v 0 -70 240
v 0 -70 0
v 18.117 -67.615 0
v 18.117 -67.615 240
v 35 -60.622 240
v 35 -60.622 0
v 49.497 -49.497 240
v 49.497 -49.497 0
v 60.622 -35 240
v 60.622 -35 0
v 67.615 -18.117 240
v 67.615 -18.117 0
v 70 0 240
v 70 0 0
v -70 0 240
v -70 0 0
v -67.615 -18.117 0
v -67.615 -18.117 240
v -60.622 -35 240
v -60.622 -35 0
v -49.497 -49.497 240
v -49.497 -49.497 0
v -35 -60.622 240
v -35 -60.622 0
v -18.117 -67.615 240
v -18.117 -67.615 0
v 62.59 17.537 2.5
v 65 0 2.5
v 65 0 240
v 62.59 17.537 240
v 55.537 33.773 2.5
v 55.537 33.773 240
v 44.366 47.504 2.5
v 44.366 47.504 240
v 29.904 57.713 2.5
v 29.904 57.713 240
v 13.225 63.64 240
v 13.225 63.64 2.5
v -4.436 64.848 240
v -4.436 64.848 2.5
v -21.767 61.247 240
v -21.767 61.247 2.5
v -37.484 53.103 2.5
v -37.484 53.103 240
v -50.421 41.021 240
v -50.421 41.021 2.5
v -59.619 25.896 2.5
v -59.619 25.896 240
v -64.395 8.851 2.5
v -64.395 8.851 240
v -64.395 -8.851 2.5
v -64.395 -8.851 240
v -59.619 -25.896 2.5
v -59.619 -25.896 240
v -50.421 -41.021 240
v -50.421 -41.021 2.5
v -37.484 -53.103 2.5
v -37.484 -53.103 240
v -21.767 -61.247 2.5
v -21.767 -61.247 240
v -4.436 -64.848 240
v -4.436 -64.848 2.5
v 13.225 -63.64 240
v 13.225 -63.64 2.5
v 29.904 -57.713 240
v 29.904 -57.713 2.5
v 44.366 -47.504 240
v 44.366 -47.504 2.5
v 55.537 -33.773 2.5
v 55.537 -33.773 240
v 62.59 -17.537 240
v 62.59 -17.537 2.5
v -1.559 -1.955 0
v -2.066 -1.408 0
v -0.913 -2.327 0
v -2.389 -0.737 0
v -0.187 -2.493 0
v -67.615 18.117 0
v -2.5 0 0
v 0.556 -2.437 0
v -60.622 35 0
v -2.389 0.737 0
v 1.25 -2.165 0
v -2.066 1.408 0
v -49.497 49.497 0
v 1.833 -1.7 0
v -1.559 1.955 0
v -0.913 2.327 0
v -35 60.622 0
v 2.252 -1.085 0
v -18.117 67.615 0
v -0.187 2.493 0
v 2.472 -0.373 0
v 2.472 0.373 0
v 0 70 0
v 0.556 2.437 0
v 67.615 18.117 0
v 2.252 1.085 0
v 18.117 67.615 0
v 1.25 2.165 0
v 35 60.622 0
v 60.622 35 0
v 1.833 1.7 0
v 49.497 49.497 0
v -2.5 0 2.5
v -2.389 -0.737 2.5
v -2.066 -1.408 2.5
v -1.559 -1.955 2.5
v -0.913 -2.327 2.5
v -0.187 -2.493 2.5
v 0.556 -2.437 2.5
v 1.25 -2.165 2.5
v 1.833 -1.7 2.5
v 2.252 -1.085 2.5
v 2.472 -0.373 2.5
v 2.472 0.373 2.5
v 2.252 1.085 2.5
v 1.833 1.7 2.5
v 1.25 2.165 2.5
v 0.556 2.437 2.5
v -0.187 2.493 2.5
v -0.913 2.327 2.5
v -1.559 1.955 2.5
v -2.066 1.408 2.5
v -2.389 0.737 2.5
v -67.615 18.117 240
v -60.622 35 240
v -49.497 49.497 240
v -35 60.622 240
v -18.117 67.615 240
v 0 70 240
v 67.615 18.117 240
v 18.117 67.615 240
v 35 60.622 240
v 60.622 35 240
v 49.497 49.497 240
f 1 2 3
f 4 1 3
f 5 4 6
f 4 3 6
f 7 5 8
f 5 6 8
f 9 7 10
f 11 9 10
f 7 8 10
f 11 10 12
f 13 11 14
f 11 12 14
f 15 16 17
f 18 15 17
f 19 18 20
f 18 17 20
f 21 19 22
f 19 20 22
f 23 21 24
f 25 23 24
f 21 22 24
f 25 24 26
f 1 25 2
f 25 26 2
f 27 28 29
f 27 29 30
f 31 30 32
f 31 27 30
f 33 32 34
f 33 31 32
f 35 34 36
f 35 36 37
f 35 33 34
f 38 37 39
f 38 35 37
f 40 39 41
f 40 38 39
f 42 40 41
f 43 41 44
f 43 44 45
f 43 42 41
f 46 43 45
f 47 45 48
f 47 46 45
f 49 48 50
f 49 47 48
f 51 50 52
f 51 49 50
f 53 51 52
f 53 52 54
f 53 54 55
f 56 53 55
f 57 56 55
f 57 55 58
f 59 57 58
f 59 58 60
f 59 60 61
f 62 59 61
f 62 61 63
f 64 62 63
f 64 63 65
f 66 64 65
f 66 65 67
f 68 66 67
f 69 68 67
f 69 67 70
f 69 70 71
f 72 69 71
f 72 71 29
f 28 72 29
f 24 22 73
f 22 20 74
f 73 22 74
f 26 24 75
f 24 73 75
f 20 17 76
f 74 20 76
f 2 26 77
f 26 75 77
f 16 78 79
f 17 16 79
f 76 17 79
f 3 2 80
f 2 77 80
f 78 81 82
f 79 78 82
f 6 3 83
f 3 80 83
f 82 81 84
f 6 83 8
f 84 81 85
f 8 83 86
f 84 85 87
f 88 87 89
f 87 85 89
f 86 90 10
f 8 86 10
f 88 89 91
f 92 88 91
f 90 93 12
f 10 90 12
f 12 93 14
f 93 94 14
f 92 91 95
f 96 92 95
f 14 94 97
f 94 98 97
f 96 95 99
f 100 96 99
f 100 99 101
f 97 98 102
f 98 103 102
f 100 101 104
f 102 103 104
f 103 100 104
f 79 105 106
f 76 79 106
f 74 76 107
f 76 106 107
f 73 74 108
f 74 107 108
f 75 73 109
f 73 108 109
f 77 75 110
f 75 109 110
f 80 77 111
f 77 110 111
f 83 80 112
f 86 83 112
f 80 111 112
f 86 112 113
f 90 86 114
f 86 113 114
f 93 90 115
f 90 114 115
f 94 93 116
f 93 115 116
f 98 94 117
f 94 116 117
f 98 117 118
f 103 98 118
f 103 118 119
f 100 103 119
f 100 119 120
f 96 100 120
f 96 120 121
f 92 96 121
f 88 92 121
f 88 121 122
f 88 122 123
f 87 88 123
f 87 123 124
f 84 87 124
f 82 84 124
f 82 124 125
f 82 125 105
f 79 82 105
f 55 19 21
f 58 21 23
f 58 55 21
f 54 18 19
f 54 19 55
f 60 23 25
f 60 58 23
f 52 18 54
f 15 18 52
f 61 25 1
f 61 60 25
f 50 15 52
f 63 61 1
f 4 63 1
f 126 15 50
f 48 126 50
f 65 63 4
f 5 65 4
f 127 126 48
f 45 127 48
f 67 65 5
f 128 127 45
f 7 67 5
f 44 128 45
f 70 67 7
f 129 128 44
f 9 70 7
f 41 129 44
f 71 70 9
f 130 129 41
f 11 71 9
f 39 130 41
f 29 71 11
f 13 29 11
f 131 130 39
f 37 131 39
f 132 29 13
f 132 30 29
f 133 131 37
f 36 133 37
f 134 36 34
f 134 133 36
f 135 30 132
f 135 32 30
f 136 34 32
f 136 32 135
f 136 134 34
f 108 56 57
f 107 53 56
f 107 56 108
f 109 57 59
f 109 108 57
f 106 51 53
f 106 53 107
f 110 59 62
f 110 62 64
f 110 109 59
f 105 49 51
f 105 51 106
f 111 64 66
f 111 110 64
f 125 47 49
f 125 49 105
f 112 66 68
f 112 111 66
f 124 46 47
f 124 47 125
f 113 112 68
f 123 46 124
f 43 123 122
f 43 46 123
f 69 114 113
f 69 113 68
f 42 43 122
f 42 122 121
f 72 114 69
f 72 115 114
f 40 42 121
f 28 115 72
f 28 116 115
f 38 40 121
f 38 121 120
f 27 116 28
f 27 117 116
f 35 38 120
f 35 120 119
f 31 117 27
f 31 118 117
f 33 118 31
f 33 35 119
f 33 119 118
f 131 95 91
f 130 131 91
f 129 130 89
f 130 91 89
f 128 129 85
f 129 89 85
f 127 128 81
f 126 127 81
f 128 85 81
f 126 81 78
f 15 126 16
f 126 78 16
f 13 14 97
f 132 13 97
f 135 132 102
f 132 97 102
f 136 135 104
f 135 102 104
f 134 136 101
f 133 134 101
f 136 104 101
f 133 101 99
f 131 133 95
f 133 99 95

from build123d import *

# Parameters (mm, degrees)
F0_R     = 65
F1_DEPTH = 240
F0_R_2   = 1.25
F2_DEPTH = 2.5
F3_D     = 5


with BuildPart() as f1:
    # F0 (on Top) → F1 (new body)
    with BuildSketch(Plane.XY):
        with BuildLine():
            ThreePointArc((70, 0), (49.497475, 49.497475), (0, 70))
            ThreePointArc((0, 70), (-49.497475, 49.497475), (-70, 0))
            ThreePointArc((-70, 0), (-49.497475, -49.497475), (0, -70))
            ThreePointArc((0, -70), (49.497475, -49.497475), (70, 0))
        make_face()
        Circle(F0_R, mode=Mode.SUBTRACT)
    extrude(amount=F1_DEPTH)

    # F0 (on Top) → F2 (join)
    with BuildSketch(Plane.XY):
        Circle(F0_R)
        Circle(F0_R_2, mode=Mode.SUBTRACT)
    extrude(amount=F2_DEPTH)

    # F3 (through all)
    with Locations(Plane(origin=(0, 0, 0), x_dir=(1, 0, 0), z_dir=(0, 0, -1))):
        with Locations((0, 0)):
            Hole(F3_D / 2)


solid = f1.part
